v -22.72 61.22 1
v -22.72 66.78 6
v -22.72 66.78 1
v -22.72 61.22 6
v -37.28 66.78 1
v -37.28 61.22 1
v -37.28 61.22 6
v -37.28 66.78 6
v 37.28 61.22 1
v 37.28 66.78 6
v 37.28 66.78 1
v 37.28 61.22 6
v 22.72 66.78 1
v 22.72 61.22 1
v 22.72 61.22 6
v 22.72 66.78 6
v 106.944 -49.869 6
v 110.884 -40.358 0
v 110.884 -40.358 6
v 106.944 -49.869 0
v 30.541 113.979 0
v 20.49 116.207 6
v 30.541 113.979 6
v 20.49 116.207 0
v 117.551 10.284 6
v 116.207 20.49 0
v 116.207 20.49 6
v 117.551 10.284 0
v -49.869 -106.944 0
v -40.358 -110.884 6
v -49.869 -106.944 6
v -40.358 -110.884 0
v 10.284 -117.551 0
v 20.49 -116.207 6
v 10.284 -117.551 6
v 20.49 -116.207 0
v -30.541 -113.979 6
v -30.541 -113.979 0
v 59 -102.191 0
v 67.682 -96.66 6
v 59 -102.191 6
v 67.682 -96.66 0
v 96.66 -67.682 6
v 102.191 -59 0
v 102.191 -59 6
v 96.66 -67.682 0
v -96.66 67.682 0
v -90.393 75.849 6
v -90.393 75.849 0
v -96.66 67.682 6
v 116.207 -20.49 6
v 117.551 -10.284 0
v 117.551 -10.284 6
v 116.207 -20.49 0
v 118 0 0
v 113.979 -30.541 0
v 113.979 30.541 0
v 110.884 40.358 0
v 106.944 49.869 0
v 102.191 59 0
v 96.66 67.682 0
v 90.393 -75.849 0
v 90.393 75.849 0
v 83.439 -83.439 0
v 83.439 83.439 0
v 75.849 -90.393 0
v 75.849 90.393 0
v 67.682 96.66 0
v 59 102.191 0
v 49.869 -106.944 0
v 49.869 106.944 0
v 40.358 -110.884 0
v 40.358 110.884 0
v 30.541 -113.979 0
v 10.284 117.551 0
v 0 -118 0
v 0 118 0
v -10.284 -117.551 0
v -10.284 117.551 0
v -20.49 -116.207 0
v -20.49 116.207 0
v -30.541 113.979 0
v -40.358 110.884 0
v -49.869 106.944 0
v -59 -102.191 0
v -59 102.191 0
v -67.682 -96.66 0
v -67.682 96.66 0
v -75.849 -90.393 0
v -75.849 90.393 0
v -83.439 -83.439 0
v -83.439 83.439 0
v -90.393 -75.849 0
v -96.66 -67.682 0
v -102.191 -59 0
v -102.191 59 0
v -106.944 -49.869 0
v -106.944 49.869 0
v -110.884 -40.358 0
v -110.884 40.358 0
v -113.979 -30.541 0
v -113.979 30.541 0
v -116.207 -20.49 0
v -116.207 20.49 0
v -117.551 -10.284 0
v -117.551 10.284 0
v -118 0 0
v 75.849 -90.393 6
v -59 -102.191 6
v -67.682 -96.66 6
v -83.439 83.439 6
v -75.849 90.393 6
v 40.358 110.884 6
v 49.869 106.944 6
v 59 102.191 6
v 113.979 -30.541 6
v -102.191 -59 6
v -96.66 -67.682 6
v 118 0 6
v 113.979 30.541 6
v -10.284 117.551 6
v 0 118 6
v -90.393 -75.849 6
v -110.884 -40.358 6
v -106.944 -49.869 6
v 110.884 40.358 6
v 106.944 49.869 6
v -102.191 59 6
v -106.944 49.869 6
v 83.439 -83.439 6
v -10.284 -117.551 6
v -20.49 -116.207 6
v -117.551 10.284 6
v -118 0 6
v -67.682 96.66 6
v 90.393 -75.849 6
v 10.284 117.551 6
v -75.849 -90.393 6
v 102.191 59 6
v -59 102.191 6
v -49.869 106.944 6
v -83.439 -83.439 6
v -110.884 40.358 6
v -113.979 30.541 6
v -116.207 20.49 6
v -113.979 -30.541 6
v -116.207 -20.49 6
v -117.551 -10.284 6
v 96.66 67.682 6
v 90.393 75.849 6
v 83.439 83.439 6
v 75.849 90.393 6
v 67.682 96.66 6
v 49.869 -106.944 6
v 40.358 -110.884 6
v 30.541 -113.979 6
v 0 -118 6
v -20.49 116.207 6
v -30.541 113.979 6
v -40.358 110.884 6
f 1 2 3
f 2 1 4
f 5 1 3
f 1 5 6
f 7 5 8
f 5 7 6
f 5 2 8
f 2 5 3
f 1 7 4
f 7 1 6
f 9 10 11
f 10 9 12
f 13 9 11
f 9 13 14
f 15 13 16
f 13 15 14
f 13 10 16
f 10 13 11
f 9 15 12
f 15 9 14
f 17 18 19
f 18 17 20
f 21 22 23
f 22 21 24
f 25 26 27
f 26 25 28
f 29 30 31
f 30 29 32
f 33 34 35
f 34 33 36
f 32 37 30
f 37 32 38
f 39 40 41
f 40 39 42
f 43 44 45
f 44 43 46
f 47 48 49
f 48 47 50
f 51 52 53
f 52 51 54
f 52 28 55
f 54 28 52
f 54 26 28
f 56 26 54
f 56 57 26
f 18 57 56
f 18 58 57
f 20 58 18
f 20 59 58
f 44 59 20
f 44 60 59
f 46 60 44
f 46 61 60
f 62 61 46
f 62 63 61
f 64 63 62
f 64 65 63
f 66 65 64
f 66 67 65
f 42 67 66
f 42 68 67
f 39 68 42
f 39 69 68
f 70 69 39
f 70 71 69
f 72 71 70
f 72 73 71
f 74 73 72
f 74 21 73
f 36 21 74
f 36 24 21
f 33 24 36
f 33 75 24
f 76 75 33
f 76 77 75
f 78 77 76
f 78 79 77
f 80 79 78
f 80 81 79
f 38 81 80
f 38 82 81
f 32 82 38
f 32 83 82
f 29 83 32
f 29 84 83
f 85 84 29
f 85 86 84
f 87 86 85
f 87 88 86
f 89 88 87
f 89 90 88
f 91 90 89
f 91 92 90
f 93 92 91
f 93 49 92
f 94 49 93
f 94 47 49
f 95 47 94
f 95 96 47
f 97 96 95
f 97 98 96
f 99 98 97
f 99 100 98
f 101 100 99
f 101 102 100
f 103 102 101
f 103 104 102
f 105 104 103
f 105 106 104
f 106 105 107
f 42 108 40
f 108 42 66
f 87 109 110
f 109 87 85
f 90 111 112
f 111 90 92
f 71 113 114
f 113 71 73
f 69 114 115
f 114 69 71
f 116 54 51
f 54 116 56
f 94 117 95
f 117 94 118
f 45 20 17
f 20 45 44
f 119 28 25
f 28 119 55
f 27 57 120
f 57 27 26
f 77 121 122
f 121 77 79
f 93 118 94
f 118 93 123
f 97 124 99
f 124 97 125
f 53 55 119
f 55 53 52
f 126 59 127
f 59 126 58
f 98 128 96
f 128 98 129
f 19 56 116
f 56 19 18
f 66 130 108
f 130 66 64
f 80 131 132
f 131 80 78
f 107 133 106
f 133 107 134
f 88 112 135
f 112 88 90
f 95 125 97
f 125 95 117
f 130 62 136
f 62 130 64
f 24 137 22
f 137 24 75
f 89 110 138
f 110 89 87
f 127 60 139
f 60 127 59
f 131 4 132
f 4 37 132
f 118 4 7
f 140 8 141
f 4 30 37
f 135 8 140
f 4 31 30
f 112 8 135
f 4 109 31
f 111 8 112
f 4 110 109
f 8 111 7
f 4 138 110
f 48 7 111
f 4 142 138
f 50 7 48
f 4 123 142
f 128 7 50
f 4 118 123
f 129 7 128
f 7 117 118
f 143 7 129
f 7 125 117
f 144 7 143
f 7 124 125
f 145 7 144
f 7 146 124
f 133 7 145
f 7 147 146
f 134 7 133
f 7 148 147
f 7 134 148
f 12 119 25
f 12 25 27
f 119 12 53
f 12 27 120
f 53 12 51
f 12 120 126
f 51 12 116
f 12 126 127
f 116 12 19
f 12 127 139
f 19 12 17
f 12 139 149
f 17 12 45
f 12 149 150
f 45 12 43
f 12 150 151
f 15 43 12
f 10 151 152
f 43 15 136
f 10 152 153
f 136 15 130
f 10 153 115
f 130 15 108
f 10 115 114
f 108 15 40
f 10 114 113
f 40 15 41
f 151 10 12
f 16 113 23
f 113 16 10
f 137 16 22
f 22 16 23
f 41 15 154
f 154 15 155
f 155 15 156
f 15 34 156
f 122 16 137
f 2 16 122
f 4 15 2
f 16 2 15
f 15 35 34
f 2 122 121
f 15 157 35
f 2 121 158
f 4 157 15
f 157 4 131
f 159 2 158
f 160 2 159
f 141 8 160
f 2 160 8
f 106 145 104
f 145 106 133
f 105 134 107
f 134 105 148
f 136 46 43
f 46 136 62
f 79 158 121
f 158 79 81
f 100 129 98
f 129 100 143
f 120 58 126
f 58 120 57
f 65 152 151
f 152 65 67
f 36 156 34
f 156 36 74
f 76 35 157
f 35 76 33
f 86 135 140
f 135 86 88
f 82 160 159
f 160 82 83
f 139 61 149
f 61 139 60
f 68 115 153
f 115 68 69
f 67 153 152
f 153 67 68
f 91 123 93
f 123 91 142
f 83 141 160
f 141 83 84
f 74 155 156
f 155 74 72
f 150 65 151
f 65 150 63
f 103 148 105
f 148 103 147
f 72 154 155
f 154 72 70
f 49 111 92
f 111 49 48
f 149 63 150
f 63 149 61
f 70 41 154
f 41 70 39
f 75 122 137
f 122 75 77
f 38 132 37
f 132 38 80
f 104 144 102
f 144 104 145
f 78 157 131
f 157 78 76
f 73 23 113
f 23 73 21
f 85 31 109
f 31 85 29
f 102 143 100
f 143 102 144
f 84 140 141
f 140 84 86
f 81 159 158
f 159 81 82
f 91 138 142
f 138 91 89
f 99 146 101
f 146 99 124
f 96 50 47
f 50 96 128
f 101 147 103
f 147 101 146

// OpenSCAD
// Memorial natalicio: arvore com texto plano embutido e cadeiras de tabuas lisas.
// Unidades: mm. Peças separadas via -D 'part="..."' e -D 'style="boards"|"logs"'.
// O modelo de conceito foi aprovado; as juntas ainda requerem prova fisica.
part = "base";
style = "boards";
variant = 1;
chair_texture = false;      // V4: nenhuma imitação de madeira nas cadeiras
$fn = 72;

base_d = 236;
base_h = 6;
tree_h = 200;
tree_t = 5;
tree_base_y = 64;             // arvore na zona traseira do disco
candle_center_y = -70;       // zona livre, sem peca de vela no projeto
candle_clear_d = 50;
ink_h = 0.56;                 // primeiras camadas: letras e borda, planas na frente
fit_clearance = 0.28;         // folga lateral nominal das espigas
chair_w = 60;
chair_print_scale = 0.75;     // cadeiras menores; todas as juntas escalam juntas
chair_origin_x = 70;
chair_origin_y = -6;
grain_comp = 1/chair_print_scale; // conserva riscos visiveis depois da reducao
side_t = 3.4;
slat_gap = chair_w-2*side_t; // 53.2 mm

// Mensagem editavel: manter linhas curtas e voltar a fatiar depois da alteracao.
line_1 = "Esta";
line_2 = "Luz";
line_3 = "Brilha";
line_4 = "em memória";
line_5 = "dos que festejam";
line_6 = "connosco a partir";
line_7 = "do céu...";
line_8 = "...sei que estarias";
line_9 = "aqui hoje se o céu";
line_10 = "não fosse tão longe...";

module rounded_rect_2d(w,h,r) {
    offset(r=r) square([w-2*r,h-2*r],center=true);
}
module path_2d(pts,d) {
    for(i=[0:len(pts)-2]) hull() {
        translate(pts[i]) circle(d=d);
        translate(pts[i+1]) circle(d=d);
    }
}
module tree_body_2d() {
    union() {
        scale([0.9,1]) polygon(points=[
            [0,167],[13,146],[9,146],[25,126],[19,126],
            [38,105],[30,105],[50,82],[40,82],[60,60],
            [48,60],[68,39],[53,39],[63,5],[-63,5],
            [-53,39],[-68,39],[-48,60],[-60,60],[-40,82],
            [-50,82],[-30,105],[-38,105],[-19,126],
            [-25,126],[-9,146],[-13,146]
        ]);
        // Star overlaps the tree point; no loose island.
        translate([0,179]) polygon(points=[for(i=[0:9])
            let(a=90+i*36,r=i%2==0?20:10) [r*cos(a),r*sin(a)]]);
        // The star joins the tree point with enough overlap for one solid print.
        translate([0,169]) square([7,12],center=true);
        // Two inserts into blind slots in the base.
        translate([-30,2.5]) square([14,5],center=true);
        translate([ 30,2.5]) square([14,5],center=true);
    }
}
module tree_border_2d() {
    difference() {
        tree_body_2d();
        offset(delta=-1.35) tree_body_2d();
    }
}
module line_text(s,y,size,font="Liberation Sans:style=Bold",delta=0.14) {
    translate([0,y]) offset(delta=delta)
        text(s,size=size,font=font,halign="center",valign="baseline");
}
module tree_letters_2d() {
    // Typeface and breaks chosen for reliable 0.4 mm FDM strokes.
    // The front prints against the bed, so the artwork must be mirrored here.
    mirror([1,0,0]) {
    line_text(line_1,128,9.8,"Liberation Serif:style=Bold Italic",0.07);
    line_text(line_2,114,11.5,"Liberation Serif:style=Bold Italic",0.07);
    line_text(line_3,99,12.5,"Liberation Serif:style=Bold Italic",0.07);
    line_text(line_4,87,8.2,"Liberation Sans:style=Bold",0.10);
    line_text(line_5,75,6.3);
    line_text(line_6,63,7.1);
    line_text(line_7,51,8);
    line_text(line_8,39,7.1);
    line_text(line_9,27,7.1);
    line_text(line_10,15,6.8);
    }
}
module tree_ink_2d() {
    intersection() {
        tree_body_2d();
        union() { tree_border_2d(); tree_letters_2d(); }
    }
}
module tree_cream() {
    difference() {
        linear_extrude(height=tree_t) tree_body_2d();
        translate([0,0,-0.02]) linear_extrude(height=ink_h+0.02) tree_ink_2d();
    }
}
module tree_brown() {
    linear_extrude(height=ink_h) tree_ink_2d();
}
module text_coupon_ink_2d() {
    mirror([1,0,0]) line_text("dos que festejam",-2.5,6.3);
}
module text_coupon_cream() {
    difference() {
        linear_extrude(height=2.4) rounded_rect_2d(96,21,2);
        translate([0,0,-0.02]) linear_extrude(height=ink_h+0.02) text_coupon_ink_2d();
    }
}
module text_coupon_brown() {
    linear_extrude(height=ink_h) text_coupon_ink_2d();
}
module joint_coupon() {
    translate([-15,0,0]) difference() {
        linear_extrude(side_t) rounded_rect_2d(18,12,1.4);
        translate([0,0,-0.1]) linear_extrude(side_t+0.2)
            square([3.8,3.8],center=true);
    }
    translate([11,0,0]) {
        linear_extrude(3.2) rounded_rect_2d(14,8,1);
        translate([7+1.65,0,0]) linear_extrude(3.2)
            square([3.3,3.2],center=true);
    }
}
module base_final() {
    difference() {
        cylinder(d=base_d,h=base_h);
        for(x=[-30,30])
            translate([x-(14+fit_clearance*2)/2,tree_base_y-(tree_t+fit_clearance*2)/2,1])
                cube([14+fit_clearance*2,tree_t+fit_clearance*2,base_h+0.2]);
    }
}
function back_x(h) = -25 - (h-61)*0.19;
module side_frame_solid_2d() {
    union() {
        path_2d([[-44,10],[-37,6],[-20,3],[0,3],[20,3],[37,6],[44,10]],6);
        path_2d([[-27,7],[-21,39],[-25,61],[-32,98]],10);
        path_2d([[25,7],[28,38],[28,60]],9);
        path_2d([[-23,42],[29,42]],9);
        path_2d([[-24,61],[27,61],[34,62]],8.5);
        path_2d([[-20,17],[26,17]],5.5);
    }
}
module side_slots_2d(which="boards") {
    // Each slot receives a 3.2 mm tab from a crosspiece.
    for(h=[67,78,89]) translate([back_x(h),h]) square([3.8,3.8],center=true);
    for(x=(which=="logs"?[-14,0,14]:[-11,11]))
        translate([x,42]) square([3.8,3.8],center=true);
    translate([26,17]) square([3.8,3.8],center=true);
}
module side_profile_2d(which="boards") {
    difference(){side_frame_solid_2d();side_slots_2d(which);}
}
// Veios contínuos, ligeiramente ondulados, orientados pelo comprimento das
// travessas. Os nós são laços concêntricos, não círculos estampados.
function beam_points(pts,row,seed) = [
    for(j=[0:len(pts)-2]) for(k=[0:12])
        let(a=pts[j], b=pts[j+1], t=k/12,
            dx=b[0]-a[0], dy=b[1]-a[1], ll=sqrt(dx*dx+dy*dy),
            px=a[0]+dx*t, py=a[1]+dy*t,
            wave=.22*sin((px+py)*29+seed+row*24)+.11*sin((px-py)*67+seed),
            shift=row*1.55+wave)
        [px-dy/ll*shift, py+dx/ll*shift]
];
module beam_veins(pts,rows=2,seed=0) {
    for(row=[-rows:rows]) path_2d(beam_points(pts,row,seed),.68*grain_comp);
}
module grain_ring(cx,cy,rx,ry,phase=0) {
    path_2d([for(a=[0:12:360])
        let(wobble=1+.035*sin(3*a+phase)+.018*sin(5*a-phase))
        [cx+rx*wobble*cos(a),cy+ry*wobble*sin(a)]],.65*grain_comp);
}
module small_beam_knot(cx,cy,phase=0) {
    grain_ring(cx,cy,3.7,1.0,phase);
    grain_ring(cx,cy,6.1,1.8,phase+35);
}
module side_grain_2d(which="boards") {
    intersection() {
        offset(delta=-0.65) side_profile_2d(which);
        union() {
            beam_veins([[-40,9],[-24,6],[-7,4],[16,5],[39,9]],1,12);
            beam_veins([[-27,8],[-22,38],[-26,61],[-32,97]],2,44);
            beam_veins([[25,8],[28,38],[28,59]],2,91);
            beam_veins([[-22,42],[3,42],[28,42]],1,122);
            beam_veins([[-22,61],[4,61],[32,62]],2,169);
            beam_veins([[-17,17],[4,17],[24,17]],1,211);
            small_beam_knot(-9,5.2,18);
            small_beam_knot(9,61.5,83);
            if(which=="logs") small_beam_knot(-26,42,154);
        }
    }
}
module chair_side(which="boards",hand="A") {
    // Both print ornament face up. One is mirrored for outward grain after assembly.
    if(hand=="A") {
        linear_extrude(side_t) side_profile_2d(which);
        if(chair_texture)
            translate([0,0,side_t]) linear_extrude(0.48*grain_comp) side_grain_2d(which);
    } else {
        mirror([1,0,0]) {
            linear_extrude(side_t) side_profile_2d(which);
            if(chair_texture)
                translate([0,0,side_t]) linear_extrude(0.48*grain_comp) side_grain_2d(which);
        }
    }
}
module crosspiece_2d(depth=11) {
    union() {
        rounded_rect_2d(slat_gap,depth,1.3);
        for(s=[-1,1]) translate([s*(slat_gap/2+1.65),0])
            square([3.3,3.2],center=true);
    }
}
function knot_x(variant) = variant==1?-11:variant==2?4:13;
function knot_y(variant,depth) = variant==2?depth*.09:variant==3?-depth*.08:0;
function plank_wave(x,y,seed,kx,ky) = y + .28*sin(x*23+seed+y*13)
    +.11*sin(x*59-seed+y*7)
    +(y<ky?-1:1)*1.35*exp(-pow((x-kx)/9,2)-pow((y-ky)/3.8,2));
module plank_knot(cx,cy,depth,phase=0,factor=1) {
    for(i=[0:3])
        grain_ring(cx,cy,(3.5+i*2.45)*factor,
            (0.9+i*.88)*min(1,depth/10.2)*factor,phase+i*21);
}
module crosspiece_grain_2d(depth=11,which="boards",variant=1) {
    kx=knot_x(variant);
    ky=knot_y(variant,depth);
    intersection() {
        offset(delta=-1) rounded_rect_2d(slat_gap,depth,1.3);
        union() {
            difference() {
                union() {
                    for(i=[0:floor((depth-2.2)/1.65)])
                        let(y=-depth/2+1.1+i*1.65)
                        path_2d([for(x=[-slat_gap/2:1.2:slat_gap/2])
                            [x,plank_wave(x,y,31+i*27+variant*43,kx,ky)]],.66*grain_comp);
                }
                translate([kx,ky]) scale([10.8,min(3.4,depth*.31)]) circle(r=1);
                if(depth>11 && variant!=3) translate([variant==1?16:-16,depth*.12])
                    scale([5.8,depth*.17]) circle(r=1);
            }
            plank_knot(kx,ky,depth,12+variant*33);
            if(depth>11 && variant!=3)
                plank_knot(variant==1?16:-16,depth*.12,depth,118+variant*19,.55);
        }
    }
}
module chair_piece(which="boards",kind="back",variant=1) {
    depth = kind=="seat" ? (which=="logs"?13:19) : (kind=="bar"?6:10.2);
    if(which=="logs" && kind!="bar") {
        linear_extrude(2.4) crosspiece_2d(depth);
        for(i=[0:5]) translate([0,0,2.4+i*.5])
            linear_extrude(.51) offset(delta=-.2-i*.40) rounded_rect_2d(slat_gap,depth,1.3);
        if(chair_texture)
            translate([0,0,5.4]) linear_extrude(.48*grain_comp)
                intersection(){crosspiece_grain_2d(depth,which,variant);offset(delta=-1.8) rounded_rect_2d(slat_gap,depth,1.3);}
    } else {
        linear_extrude(3.2) crosspiece_2d(depth);
        if(chair_texture)
            translate([0,0,3.2]) linear_extrude(.48*grain_comp) crosspiece_grain_2d(depth,which,variant);
    }
}
module wood_coupon() {
    linear_extrude(2.4) rounded_rect_2d(slat_gap,19,1.3);
    translate([0,0,2.4]) linear_extrude(.48*grain_comp)
        crosspiece_grain_2d(19,"boards",2);
}

// Visual assembly only. For printing, export each named part separately.
module chair_assembly(which="boards") {
    color("#986039") multmatrix([
        [0,0,-1,-chair_w/2+side_t],[-1,0,0,0],[0,1,0,base_h],[0,0,0,1]])
        chair_side(which,"A");
    color("#986039") multmatrix([
        [0,0,1,chair_w/2-side_t],[1,0,0,0],[0,1,0,base_h],[0,0,0,1]])
        chair_side(which,"B");
    for(i=[0:2]) let(h=[67,78,89][i]) color("#aa6e40") multmatrix([
        [1,0,0,0],[0,0,-1,-back_x(h)+1.6],[0,1,0,base_h+h],[0,0,0,1]])
        chair_piece(which,"back",i+1);
    for(i=[0:(which=="logs"?2:1)])
        let(x=(which=="logs"?[-14,0,14]:[-11,11])[i])
        color("#aa6e40") translate([0,x,base_h+42-1.6]) chair_piece(which,"seat",i+1);
    color("#aa6e40") multmatrix([
        [1,0,0,0],[0,0,-1,-26+1.6],[0,1,0,base_h+17],[0,0,0,1]])
        chair_piece(which,"bar");
}
module preview() {
    color("#f0e2c4") base_final();
    multmatrix([[-1,0,0,0],[0,0,1,tree_base_y-tree_t/2],[0,1,0,1]]) {
        color("#f4e5c8") tree_cream();
        color("#513420") tree_brown();
    }
    translate([-chair_origin_x,chair_origin_y,base_h*(1-chair_print_scale)])
        rotate([0,0,10]) scale([chair_print_scale,chair_print_scale,chair_print_scale]) chair_assembly("boards");
    translate([chair_origin_x,chair_origin_y,base_h*(1-chair_print_scale)])
        rotate([0,0,-10]) scale([chair_print_scale,chair_print_scale,chair_print_scale]) chair_assembly("boards");
}

if(part=="base") base_final();
else if(part=="tree_cream") tree_cream();
else if(part=="tree_brown") tree_brown();
else if(part=="text_coupon_cream") text_coupon_cream();
else if(part=="text_coupon_brown") text_coupon_brown();
else if(part=="joint_coupon") scale([chair_print_scale,chair_print_scale,chair_print_scale]) joint_coupon();
else if(part=="wood_coupon") scale([chair_print_scale,chair_print_scale,chair_print_scale]) wood_coupon();
else if(part=="side_A") scale([chair_print_scale,chair_print_scale,chair_print_scale]) chair_side(style,"A");
else if(part=="side_B") scale([chair_print_scale,chair_print_scale,chair_print_scale]) chair_side(style,"B");
else if(part=="back") scale([chair_print_scale,chair_print_scale,chair_print_scale]) chair_piece(style,"back",variant);
else if(part=="seat") scale([chair_print_scale,chair_print_scale,chair_print_scale]) chair_piece(style,"seat",variant);
else if(part=="bar") scale([chair_print_scale,chair_print_scale,chair_print_scale]) chair_piece(style,"bar");
else if(part=="preview") preview();
else assert(false,str("Unknown part: ",part));
